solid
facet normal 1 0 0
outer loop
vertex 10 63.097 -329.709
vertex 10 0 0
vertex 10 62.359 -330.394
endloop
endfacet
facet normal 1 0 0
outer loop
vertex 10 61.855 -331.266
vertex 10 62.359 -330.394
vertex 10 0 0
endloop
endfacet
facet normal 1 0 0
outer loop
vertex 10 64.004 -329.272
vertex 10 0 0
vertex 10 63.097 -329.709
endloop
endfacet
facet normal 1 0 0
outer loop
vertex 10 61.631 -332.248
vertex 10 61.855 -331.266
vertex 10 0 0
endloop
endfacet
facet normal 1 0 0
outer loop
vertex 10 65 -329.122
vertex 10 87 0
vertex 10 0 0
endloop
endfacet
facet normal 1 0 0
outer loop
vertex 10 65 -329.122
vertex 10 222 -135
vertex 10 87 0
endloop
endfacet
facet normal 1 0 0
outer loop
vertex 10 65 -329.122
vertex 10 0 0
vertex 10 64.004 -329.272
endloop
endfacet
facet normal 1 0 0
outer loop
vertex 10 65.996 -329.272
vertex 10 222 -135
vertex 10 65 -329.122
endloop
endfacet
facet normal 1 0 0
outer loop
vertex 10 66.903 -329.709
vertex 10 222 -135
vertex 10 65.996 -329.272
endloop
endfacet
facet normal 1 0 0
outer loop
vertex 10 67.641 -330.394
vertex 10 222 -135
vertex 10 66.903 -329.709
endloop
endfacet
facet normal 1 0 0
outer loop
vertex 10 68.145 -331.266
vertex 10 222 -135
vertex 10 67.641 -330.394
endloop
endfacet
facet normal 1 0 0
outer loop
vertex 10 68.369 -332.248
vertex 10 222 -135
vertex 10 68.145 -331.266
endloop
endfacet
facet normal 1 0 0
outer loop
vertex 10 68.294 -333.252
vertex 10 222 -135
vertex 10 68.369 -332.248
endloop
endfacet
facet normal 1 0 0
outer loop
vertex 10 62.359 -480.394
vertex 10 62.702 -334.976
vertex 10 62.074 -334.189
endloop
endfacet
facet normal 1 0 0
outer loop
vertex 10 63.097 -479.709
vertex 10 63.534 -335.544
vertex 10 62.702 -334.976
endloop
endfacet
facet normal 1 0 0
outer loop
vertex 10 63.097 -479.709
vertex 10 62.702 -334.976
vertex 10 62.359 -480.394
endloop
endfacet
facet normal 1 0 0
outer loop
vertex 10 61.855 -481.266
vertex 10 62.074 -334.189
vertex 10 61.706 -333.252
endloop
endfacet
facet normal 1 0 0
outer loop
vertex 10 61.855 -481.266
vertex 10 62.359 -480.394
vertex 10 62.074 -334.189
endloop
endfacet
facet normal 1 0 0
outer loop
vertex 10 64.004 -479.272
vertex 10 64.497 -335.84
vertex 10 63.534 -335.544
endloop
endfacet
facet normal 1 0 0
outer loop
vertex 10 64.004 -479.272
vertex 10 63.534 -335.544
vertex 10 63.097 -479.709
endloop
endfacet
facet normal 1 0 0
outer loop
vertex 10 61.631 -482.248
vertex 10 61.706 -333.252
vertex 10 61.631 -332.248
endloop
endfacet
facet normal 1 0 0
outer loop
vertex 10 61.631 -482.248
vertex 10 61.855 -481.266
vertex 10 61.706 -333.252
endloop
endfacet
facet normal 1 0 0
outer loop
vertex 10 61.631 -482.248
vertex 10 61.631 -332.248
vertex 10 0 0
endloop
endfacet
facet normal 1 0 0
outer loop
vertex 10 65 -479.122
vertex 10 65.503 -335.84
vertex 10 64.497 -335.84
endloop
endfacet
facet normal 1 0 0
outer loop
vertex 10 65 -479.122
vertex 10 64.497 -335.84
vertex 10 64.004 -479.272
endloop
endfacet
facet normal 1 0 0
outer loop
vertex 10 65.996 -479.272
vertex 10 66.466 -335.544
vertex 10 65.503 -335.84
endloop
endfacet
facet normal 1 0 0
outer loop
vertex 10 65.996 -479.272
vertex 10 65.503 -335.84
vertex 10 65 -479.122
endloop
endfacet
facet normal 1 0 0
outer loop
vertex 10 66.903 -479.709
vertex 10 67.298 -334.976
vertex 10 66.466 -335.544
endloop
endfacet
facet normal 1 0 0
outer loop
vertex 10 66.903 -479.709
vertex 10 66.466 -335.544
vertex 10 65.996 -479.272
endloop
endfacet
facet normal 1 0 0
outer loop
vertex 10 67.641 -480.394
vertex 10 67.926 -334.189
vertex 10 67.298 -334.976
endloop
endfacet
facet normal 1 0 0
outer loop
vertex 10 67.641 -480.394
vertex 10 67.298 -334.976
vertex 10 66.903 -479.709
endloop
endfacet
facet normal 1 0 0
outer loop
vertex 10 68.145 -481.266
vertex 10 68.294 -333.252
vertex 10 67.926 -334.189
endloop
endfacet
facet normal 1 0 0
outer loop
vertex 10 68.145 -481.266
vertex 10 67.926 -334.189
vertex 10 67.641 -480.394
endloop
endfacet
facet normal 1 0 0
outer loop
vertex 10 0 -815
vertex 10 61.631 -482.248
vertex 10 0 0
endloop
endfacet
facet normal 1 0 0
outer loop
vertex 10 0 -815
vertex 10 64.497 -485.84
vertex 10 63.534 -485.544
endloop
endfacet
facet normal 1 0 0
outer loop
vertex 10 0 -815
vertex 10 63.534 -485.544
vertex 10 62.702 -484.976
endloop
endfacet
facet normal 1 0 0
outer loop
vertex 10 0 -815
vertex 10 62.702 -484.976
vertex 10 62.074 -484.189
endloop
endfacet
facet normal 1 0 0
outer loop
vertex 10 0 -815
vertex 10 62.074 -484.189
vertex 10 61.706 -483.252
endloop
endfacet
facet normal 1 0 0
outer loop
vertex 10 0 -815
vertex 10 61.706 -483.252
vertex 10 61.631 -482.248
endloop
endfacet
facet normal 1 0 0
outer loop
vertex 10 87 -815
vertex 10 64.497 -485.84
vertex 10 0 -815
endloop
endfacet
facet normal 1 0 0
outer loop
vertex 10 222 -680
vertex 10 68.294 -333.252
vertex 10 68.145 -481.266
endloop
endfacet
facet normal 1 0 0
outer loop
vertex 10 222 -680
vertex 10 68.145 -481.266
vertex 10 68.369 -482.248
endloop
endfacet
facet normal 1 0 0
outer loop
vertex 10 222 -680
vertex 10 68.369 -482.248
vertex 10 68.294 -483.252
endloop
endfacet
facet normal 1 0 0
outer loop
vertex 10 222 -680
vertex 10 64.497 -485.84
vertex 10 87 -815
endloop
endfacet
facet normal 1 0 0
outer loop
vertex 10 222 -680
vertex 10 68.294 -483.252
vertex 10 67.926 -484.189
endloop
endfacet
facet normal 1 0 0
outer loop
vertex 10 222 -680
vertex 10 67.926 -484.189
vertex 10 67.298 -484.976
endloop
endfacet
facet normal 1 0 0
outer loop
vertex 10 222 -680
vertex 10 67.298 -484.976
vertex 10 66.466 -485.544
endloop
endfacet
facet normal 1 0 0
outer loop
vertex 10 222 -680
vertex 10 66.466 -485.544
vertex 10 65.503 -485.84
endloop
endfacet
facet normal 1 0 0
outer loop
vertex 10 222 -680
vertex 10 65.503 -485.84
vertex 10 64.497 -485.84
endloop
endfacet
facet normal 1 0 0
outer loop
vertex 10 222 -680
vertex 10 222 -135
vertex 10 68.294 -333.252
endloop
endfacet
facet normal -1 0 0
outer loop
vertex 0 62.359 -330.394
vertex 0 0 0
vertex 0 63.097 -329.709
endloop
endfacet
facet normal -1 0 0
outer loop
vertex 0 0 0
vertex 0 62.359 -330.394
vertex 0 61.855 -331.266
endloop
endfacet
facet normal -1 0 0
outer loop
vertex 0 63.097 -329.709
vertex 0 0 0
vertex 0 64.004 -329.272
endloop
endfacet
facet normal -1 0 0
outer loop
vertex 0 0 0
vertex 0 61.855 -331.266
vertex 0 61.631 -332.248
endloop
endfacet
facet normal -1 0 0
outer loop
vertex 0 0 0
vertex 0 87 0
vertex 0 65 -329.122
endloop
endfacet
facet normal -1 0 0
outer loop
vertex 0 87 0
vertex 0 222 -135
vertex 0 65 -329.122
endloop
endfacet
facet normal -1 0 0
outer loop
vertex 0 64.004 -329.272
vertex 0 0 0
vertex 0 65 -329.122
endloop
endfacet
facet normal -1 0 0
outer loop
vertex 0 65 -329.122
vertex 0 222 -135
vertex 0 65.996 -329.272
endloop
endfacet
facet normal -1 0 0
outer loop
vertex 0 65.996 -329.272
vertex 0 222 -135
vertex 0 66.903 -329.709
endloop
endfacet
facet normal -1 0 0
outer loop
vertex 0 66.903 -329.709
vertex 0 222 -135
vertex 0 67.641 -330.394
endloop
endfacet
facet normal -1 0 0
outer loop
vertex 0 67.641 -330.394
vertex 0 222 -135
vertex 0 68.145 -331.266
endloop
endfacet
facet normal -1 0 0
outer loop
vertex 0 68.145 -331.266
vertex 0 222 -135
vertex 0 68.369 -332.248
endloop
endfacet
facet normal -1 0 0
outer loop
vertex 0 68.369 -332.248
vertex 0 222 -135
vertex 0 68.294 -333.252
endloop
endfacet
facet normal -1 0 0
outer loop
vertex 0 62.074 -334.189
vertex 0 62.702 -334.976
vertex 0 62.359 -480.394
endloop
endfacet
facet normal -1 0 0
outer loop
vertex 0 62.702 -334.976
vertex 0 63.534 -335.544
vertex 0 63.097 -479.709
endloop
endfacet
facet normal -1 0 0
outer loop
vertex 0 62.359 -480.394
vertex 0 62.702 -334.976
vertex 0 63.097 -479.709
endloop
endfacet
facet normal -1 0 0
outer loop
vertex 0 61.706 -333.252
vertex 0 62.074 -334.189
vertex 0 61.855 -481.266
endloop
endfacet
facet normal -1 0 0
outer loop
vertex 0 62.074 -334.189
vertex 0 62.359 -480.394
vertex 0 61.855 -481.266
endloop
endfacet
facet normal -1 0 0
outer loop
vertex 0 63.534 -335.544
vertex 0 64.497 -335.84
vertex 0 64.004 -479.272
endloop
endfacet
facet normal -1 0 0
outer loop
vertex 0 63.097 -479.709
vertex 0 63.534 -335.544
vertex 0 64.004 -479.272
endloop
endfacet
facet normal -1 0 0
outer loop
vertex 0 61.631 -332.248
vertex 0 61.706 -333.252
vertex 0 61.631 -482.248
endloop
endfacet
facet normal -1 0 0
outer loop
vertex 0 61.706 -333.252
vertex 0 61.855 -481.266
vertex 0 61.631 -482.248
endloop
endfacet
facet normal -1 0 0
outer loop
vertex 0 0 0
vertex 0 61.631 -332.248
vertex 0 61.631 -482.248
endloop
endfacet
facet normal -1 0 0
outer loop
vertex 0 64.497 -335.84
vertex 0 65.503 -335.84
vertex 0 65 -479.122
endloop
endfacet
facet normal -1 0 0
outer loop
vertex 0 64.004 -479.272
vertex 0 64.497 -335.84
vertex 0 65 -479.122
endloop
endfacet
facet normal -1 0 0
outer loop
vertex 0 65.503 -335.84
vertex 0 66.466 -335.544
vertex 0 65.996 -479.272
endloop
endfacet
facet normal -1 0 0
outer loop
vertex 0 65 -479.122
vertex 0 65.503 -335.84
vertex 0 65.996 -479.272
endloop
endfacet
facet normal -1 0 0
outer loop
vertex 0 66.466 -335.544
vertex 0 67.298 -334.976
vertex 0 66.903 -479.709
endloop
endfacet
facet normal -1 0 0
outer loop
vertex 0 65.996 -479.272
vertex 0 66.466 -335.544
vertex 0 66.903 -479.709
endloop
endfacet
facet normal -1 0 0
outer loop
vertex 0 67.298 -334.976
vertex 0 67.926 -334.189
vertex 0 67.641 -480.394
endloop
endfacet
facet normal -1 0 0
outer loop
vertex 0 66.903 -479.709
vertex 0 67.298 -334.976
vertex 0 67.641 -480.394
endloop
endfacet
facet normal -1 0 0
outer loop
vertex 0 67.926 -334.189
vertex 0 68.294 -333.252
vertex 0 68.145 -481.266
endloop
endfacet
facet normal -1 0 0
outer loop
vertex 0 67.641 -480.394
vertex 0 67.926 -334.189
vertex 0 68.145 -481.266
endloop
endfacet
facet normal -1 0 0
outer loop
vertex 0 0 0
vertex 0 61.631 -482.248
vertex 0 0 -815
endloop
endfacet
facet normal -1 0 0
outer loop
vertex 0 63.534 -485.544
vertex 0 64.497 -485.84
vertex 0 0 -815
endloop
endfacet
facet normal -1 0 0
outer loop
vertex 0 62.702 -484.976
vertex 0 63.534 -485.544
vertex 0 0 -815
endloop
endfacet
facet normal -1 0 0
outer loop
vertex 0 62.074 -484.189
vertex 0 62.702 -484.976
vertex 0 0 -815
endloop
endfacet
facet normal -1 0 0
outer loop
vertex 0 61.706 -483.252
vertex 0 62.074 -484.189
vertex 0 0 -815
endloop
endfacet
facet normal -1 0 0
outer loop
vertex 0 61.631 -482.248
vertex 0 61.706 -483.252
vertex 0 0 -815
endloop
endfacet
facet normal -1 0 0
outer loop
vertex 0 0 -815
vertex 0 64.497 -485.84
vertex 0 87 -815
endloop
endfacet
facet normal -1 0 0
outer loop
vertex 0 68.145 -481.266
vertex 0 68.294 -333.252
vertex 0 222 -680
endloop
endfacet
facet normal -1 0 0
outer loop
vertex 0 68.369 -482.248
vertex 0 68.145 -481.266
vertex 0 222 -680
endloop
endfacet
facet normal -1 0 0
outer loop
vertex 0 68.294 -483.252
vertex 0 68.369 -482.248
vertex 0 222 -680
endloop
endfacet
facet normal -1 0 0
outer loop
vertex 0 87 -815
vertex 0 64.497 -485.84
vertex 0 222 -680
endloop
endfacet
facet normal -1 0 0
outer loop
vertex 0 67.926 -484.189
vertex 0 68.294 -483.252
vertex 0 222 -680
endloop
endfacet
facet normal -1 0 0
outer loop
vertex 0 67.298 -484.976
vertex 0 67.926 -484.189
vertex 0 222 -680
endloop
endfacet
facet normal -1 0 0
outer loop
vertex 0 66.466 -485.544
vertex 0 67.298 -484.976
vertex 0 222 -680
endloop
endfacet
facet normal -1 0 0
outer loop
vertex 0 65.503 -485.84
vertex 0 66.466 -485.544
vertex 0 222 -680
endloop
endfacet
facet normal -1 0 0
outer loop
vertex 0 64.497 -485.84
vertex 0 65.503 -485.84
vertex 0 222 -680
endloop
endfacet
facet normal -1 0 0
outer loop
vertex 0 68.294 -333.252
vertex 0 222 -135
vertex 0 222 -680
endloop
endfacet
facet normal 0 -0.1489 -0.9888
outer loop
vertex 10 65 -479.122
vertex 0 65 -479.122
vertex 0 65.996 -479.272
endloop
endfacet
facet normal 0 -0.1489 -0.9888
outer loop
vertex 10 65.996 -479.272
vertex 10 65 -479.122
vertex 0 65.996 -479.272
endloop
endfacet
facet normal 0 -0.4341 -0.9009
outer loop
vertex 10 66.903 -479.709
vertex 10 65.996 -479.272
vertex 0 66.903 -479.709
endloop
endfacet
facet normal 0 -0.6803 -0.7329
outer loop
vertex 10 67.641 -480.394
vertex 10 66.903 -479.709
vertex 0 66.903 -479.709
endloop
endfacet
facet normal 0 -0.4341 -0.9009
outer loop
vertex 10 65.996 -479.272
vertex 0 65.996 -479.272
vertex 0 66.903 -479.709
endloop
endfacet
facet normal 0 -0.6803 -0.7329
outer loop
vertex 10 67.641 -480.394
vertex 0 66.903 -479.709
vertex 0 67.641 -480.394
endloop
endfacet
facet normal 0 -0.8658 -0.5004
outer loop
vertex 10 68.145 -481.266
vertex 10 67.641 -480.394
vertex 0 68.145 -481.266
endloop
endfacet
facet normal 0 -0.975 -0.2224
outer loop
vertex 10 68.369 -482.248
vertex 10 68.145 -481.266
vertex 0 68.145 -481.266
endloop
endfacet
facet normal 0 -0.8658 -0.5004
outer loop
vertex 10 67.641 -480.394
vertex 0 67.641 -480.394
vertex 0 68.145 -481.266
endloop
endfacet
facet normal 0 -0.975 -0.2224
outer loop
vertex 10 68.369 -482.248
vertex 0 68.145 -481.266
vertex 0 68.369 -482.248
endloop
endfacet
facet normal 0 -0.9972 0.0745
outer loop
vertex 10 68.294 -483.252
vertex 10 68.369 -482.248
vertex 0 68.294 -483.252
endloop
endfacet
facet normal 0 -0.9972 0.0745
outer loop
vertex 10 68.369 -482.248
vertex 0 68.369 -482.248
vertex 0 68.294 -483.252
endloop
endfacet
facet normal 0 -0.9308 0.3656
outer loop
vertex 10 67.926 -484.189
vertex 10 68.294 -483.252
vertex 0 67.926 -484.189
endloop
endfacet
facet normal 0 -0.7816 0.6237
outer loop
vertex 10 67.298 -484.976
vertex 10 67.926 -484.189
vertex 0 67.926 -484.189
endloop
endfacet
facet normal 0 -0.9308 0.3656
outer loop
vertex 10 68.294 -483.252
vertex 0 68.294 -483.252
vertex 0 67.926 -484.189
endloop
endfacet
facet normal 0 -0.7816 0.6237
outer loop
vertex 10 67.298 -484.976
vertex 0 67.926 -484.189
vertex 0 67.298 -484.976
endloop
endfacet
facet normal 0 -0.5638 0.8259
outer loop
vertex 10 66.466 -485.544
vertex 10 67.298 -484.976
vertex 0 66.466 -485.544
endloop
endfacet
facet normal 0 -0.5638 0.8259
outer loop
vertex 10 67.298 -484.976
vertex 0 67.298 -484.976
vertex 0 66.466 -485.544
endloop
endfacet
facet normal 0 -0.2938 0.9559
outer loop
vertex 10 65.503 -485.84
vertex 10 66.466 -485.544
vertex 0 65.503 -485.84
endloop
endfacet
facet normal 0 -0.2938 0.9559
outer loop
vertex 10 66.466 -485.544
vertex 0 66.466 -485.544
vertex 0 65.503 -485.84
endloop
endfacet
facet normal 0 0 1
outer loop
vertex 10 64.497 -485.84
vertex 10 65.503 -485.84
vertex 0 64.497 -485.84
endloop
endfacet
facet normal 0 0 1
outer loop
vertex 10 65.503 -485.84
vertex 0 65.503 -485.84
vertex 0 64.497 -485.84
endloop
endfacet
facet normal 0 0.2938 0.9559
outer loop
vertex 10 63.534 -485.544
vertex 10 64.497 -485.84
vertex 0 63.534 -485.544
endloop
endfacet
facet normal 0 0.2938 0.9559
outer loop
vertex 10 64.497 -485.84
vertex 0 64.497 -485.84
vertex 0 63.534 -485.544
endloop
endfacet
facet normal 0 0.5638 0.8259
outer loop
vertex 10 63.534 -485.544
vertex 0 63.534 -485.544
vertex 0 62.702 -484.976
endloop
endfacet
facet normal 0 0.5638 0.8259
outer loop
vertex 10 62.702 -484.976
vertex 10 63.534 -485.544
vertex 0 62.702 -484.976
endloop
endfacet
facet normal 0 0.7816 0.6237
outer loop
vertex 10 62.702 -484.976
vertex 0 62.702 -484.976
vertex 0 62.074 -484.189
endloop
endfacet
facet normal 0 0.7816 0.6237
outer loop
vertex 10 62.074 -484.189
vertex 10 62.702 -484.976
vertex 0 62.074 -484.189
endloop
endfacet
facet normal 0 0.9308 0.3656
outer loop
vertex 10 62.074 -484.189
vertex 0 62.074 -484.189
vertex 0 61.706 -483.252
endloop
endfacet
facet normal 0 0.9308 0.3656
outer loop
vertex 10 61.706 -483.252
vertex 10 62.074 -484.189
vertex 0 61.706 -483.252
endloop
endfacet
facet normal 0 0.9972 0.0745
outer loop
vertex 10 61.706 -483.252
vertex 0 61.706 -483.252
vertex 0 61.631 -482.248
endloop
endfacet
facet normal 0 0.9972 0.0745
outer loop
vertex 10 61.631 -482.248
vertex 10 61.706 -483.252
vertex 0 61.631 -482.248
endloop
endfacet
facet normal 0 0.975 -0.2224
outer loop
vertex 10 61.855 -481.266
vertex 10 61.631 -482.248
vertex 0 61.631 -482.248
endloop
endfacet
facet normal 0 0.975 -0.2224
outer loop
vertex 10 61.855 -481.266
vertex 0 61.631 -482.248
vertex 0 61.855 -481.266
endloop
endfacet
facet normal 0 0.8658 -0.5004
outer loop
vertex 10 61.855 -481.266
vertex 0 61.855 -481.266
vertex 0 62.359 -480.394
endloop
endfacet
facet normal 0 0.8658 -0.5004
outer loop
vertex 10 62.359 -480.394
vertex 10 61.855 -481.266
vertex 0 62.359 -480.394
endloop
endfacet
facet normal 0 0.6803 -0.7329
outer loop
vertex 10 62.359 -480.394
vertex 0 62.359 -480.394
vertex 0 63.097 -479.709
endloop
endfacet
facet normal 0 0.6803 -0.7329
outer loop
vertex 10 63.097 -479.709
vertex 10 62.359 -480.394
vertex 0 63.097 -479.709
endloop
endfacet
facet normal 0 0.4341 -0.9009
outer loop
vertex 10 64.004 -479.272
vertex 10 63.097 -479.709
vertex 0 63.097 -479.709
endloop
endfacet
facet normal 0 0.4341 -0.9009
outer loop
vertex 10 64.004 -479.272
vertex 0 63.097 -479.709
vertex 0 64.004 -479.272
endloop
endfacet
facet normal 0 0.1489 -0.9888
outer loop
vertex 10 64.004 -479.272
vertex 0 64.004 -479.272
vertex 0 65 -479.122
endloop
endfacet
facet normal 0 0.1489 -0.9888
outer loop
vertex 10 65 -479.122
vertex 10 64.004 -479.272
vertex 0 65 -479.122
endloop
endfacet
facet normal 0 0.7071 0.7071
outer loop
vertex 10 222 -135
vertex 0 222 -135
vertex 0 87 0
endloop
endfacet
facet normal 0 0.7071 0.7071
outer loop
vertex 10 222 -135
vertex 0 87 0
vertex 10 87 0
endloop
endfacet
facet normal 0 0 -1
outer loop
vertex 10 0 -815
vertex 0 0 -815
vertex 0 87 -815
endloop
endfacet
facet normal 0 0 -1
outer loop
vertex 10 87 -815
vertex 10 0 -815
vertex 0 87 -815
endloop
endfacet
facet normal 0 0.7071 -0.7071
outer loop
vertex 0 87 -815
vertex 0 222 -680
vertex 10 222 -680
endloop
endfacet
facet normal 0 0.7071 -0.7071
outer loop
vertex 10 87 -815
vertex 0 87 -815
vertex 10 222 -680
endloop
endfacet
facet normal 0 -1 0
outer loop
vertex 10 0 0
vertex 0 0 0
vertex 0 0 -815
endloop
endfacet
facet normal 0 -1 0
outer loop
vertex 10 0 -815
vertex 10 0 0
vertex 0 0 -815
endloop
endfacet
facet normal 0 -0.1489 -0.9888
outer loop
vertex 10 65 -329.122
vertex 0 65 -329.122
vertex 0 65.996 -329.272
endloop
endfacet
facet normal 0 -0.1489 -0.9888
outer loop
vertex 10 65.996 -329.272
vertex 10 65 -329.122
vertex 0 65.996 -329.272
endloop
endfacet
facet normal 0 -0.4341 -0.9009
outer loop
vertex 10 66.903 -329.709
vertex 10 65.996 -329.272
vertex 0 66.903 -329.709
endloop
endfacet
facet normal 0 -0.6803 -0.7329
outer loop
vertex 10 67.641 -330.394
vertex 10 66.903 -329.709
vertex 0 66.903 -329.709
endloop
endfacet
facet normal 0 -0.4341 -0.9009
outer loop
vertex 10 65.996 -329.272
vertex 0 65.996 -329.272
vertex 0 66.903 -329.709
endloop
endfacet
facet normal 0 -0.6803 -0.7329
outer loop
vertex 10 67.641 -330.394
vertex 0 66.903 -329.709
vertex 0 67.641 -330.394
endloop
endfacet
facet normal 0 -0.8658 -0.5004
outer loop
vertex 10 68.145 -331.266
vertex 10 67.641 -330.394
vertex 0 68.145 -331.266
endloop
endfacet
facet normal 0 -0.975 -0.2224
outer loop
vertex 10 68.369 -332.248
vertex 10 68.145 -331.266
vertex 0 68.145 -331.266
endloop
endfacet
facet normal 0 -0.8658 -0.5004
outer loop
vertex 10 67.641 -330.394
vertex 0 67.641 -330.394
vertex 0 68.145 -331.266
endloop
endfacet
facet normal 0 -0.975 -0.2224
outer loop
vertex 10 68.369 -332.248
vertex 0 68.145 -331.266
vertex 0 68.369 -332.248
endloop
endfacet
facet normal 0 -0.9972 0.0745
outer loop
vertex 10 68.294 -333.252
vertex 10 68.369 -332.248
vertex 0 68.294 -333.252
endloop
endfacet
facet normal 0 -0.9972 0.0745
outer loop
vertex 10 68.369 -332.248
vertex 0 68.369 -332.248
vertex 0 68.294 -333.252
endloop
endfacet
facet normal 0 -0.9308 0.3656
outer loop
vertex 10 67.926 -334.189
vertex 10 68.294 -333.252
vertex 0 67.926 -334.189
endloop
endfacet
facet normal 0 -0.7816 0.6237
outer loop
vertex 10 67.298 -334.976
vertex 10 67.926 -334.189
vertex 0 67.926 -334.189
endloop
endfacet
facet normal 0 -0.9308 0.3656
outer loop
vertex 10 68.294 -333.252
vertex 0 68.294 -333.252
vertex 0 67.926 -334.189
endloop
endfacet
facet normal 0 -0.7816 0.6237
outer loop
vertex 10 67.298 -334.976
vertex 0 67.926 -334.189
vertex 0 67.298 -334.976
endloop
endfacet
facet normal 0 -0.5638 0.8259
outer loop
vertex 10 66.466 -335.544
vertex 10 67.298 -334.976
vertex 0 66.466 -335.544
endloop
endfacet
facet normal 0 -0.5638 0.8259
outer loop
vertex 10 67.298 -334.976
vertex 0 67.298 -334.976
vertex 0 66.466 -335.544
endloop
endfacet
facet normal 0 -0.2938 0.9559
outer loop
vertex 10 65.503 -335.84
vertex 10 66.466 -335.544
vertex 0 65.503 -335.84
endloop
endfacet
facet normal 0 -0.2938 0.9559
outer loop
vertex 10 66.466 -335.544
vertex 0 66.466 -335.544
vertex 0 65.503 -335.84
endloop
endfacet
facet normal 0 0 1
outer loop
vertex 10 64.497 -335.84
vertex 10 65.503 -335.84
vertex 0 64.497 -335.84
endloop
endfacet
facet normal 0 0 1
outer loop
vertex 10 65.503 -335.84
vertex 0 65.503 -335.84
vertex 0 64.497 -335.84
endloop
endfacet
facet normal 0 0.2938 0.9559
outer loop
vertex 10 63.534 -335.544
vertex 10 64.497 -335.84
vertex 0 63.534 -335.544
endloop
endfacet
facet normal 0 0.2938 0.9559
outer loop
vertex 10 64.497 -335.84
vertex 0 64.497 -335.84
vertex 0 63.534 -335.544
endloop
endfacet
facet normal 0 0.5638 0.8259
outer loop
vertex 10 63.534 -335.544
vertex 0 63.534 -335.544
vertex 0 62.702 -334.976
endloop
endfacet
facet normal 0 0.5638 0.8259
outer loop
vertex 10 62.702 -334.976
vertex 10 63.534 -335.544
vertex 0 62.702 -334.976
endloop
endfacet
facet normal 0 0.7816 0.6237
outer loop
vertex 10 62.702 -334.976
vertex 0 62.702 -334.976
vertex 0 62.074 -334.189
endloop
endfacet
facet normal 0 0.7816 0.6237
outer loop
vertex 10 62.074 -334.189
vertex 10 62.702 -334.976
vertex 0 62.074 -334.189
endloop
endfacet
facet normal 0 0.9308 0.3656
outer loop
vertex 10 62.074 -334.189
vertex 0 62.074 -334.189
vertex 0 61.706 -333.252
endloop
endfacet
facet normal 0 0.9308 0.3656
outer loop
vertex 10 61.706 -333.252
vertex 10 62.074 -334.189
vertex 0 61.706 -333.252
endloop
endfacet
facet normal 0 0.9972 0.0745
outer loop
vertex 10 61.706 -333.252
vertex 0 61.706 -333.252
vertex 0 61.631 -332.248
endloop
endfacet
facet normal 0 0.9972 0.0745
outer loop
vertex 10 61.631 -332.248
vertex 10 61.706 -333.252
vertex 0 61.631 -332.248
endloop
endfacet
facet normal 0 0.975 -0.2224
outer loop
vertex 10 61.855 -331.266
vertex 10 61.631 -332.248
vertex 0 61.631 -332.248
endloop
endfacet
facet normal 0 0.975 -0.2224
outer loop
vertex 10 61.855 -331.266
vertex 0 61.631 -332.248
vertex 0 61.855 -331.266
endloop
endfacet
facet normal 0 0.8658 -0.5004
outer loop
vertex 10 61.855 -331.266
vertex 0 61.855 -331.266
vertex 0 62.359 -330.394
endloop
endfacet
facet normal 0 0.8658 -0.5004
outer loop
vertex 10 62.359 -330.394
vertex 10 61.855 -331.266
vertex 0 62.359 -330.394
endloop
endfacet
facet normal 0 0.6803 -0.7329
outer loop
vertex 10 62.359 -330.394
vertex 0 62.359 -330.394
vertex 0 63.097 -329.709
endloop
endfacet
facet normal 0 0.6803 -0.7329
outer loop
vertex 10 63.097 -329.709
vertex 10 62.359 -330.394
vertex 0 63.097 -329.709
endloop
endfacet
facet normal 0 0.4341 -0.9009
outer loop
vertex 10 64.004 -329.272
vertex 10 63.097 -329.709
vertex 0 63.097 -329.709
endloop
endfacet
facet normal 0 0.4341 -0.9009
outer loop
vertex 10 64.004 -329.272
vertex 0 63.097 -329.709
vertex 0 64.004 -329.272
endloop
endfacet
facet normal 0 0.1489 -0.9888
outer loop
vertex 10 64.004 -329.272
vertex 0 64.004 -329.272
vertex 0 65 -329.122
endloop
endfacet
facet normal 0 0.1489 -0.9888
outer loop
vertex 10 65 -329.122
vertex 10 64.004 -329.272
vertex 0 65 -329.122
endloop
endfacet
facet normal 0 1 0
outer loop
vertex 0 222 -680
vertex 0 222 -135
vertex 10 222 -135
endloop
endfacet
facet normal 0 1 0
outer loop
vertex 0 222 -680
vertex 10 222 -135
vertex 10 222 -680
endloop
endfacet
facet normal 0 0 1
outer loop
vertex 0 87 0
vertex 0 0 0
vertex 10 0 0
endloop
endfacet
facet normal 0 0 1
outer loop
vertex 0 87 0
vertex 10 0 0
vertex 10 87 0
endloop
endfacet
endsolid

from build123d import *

# Parameters (mm, degrees)
SKETCH1_W               = 815
SKETCH1_H               = 222
BOSS_EXTRUDE1_DEPTH     = 10
CHAMFER1_SIZE           = 135
F_1_4_CLEARANCE_HOLE1_D = 6.7564


with BuildPart() as part:
    # Sketch1 → Boss-Extrude1 (new body)
    with BuildSketch(Plane(origin=(0, 0, 0), x_dir=(0, 0, -1), z_dir=(1, 0, 0))):
        with Locations((407.5, 111)):
            Rectangle(SKETCH1_W, SKETCH1_H)
    extrude(amount=BOSS_EXTRUDE1_DEPTH)

    # Chamfer1
    chamfer1_edges = [part.edges().sort_by_distance(p)[0] for p in [
        (5, 222, 0),
        (5, 222, -815),
    ]]
    chamfer(chamfer1_edges, length=CHAMFER1_SIZE)

    # 1/4 Clearance Hole1 (through all)
    with Locations(Plane(origin=(10, 0, 0), x_dir=(0, 0, -1), z_dir=(1, 0, 0))):
        with Locations((482.5, 65), (332.5, 65)):
            Hole(F_1_4_CLEARANCE_HOLE1_D / 2)


solid = part.part
